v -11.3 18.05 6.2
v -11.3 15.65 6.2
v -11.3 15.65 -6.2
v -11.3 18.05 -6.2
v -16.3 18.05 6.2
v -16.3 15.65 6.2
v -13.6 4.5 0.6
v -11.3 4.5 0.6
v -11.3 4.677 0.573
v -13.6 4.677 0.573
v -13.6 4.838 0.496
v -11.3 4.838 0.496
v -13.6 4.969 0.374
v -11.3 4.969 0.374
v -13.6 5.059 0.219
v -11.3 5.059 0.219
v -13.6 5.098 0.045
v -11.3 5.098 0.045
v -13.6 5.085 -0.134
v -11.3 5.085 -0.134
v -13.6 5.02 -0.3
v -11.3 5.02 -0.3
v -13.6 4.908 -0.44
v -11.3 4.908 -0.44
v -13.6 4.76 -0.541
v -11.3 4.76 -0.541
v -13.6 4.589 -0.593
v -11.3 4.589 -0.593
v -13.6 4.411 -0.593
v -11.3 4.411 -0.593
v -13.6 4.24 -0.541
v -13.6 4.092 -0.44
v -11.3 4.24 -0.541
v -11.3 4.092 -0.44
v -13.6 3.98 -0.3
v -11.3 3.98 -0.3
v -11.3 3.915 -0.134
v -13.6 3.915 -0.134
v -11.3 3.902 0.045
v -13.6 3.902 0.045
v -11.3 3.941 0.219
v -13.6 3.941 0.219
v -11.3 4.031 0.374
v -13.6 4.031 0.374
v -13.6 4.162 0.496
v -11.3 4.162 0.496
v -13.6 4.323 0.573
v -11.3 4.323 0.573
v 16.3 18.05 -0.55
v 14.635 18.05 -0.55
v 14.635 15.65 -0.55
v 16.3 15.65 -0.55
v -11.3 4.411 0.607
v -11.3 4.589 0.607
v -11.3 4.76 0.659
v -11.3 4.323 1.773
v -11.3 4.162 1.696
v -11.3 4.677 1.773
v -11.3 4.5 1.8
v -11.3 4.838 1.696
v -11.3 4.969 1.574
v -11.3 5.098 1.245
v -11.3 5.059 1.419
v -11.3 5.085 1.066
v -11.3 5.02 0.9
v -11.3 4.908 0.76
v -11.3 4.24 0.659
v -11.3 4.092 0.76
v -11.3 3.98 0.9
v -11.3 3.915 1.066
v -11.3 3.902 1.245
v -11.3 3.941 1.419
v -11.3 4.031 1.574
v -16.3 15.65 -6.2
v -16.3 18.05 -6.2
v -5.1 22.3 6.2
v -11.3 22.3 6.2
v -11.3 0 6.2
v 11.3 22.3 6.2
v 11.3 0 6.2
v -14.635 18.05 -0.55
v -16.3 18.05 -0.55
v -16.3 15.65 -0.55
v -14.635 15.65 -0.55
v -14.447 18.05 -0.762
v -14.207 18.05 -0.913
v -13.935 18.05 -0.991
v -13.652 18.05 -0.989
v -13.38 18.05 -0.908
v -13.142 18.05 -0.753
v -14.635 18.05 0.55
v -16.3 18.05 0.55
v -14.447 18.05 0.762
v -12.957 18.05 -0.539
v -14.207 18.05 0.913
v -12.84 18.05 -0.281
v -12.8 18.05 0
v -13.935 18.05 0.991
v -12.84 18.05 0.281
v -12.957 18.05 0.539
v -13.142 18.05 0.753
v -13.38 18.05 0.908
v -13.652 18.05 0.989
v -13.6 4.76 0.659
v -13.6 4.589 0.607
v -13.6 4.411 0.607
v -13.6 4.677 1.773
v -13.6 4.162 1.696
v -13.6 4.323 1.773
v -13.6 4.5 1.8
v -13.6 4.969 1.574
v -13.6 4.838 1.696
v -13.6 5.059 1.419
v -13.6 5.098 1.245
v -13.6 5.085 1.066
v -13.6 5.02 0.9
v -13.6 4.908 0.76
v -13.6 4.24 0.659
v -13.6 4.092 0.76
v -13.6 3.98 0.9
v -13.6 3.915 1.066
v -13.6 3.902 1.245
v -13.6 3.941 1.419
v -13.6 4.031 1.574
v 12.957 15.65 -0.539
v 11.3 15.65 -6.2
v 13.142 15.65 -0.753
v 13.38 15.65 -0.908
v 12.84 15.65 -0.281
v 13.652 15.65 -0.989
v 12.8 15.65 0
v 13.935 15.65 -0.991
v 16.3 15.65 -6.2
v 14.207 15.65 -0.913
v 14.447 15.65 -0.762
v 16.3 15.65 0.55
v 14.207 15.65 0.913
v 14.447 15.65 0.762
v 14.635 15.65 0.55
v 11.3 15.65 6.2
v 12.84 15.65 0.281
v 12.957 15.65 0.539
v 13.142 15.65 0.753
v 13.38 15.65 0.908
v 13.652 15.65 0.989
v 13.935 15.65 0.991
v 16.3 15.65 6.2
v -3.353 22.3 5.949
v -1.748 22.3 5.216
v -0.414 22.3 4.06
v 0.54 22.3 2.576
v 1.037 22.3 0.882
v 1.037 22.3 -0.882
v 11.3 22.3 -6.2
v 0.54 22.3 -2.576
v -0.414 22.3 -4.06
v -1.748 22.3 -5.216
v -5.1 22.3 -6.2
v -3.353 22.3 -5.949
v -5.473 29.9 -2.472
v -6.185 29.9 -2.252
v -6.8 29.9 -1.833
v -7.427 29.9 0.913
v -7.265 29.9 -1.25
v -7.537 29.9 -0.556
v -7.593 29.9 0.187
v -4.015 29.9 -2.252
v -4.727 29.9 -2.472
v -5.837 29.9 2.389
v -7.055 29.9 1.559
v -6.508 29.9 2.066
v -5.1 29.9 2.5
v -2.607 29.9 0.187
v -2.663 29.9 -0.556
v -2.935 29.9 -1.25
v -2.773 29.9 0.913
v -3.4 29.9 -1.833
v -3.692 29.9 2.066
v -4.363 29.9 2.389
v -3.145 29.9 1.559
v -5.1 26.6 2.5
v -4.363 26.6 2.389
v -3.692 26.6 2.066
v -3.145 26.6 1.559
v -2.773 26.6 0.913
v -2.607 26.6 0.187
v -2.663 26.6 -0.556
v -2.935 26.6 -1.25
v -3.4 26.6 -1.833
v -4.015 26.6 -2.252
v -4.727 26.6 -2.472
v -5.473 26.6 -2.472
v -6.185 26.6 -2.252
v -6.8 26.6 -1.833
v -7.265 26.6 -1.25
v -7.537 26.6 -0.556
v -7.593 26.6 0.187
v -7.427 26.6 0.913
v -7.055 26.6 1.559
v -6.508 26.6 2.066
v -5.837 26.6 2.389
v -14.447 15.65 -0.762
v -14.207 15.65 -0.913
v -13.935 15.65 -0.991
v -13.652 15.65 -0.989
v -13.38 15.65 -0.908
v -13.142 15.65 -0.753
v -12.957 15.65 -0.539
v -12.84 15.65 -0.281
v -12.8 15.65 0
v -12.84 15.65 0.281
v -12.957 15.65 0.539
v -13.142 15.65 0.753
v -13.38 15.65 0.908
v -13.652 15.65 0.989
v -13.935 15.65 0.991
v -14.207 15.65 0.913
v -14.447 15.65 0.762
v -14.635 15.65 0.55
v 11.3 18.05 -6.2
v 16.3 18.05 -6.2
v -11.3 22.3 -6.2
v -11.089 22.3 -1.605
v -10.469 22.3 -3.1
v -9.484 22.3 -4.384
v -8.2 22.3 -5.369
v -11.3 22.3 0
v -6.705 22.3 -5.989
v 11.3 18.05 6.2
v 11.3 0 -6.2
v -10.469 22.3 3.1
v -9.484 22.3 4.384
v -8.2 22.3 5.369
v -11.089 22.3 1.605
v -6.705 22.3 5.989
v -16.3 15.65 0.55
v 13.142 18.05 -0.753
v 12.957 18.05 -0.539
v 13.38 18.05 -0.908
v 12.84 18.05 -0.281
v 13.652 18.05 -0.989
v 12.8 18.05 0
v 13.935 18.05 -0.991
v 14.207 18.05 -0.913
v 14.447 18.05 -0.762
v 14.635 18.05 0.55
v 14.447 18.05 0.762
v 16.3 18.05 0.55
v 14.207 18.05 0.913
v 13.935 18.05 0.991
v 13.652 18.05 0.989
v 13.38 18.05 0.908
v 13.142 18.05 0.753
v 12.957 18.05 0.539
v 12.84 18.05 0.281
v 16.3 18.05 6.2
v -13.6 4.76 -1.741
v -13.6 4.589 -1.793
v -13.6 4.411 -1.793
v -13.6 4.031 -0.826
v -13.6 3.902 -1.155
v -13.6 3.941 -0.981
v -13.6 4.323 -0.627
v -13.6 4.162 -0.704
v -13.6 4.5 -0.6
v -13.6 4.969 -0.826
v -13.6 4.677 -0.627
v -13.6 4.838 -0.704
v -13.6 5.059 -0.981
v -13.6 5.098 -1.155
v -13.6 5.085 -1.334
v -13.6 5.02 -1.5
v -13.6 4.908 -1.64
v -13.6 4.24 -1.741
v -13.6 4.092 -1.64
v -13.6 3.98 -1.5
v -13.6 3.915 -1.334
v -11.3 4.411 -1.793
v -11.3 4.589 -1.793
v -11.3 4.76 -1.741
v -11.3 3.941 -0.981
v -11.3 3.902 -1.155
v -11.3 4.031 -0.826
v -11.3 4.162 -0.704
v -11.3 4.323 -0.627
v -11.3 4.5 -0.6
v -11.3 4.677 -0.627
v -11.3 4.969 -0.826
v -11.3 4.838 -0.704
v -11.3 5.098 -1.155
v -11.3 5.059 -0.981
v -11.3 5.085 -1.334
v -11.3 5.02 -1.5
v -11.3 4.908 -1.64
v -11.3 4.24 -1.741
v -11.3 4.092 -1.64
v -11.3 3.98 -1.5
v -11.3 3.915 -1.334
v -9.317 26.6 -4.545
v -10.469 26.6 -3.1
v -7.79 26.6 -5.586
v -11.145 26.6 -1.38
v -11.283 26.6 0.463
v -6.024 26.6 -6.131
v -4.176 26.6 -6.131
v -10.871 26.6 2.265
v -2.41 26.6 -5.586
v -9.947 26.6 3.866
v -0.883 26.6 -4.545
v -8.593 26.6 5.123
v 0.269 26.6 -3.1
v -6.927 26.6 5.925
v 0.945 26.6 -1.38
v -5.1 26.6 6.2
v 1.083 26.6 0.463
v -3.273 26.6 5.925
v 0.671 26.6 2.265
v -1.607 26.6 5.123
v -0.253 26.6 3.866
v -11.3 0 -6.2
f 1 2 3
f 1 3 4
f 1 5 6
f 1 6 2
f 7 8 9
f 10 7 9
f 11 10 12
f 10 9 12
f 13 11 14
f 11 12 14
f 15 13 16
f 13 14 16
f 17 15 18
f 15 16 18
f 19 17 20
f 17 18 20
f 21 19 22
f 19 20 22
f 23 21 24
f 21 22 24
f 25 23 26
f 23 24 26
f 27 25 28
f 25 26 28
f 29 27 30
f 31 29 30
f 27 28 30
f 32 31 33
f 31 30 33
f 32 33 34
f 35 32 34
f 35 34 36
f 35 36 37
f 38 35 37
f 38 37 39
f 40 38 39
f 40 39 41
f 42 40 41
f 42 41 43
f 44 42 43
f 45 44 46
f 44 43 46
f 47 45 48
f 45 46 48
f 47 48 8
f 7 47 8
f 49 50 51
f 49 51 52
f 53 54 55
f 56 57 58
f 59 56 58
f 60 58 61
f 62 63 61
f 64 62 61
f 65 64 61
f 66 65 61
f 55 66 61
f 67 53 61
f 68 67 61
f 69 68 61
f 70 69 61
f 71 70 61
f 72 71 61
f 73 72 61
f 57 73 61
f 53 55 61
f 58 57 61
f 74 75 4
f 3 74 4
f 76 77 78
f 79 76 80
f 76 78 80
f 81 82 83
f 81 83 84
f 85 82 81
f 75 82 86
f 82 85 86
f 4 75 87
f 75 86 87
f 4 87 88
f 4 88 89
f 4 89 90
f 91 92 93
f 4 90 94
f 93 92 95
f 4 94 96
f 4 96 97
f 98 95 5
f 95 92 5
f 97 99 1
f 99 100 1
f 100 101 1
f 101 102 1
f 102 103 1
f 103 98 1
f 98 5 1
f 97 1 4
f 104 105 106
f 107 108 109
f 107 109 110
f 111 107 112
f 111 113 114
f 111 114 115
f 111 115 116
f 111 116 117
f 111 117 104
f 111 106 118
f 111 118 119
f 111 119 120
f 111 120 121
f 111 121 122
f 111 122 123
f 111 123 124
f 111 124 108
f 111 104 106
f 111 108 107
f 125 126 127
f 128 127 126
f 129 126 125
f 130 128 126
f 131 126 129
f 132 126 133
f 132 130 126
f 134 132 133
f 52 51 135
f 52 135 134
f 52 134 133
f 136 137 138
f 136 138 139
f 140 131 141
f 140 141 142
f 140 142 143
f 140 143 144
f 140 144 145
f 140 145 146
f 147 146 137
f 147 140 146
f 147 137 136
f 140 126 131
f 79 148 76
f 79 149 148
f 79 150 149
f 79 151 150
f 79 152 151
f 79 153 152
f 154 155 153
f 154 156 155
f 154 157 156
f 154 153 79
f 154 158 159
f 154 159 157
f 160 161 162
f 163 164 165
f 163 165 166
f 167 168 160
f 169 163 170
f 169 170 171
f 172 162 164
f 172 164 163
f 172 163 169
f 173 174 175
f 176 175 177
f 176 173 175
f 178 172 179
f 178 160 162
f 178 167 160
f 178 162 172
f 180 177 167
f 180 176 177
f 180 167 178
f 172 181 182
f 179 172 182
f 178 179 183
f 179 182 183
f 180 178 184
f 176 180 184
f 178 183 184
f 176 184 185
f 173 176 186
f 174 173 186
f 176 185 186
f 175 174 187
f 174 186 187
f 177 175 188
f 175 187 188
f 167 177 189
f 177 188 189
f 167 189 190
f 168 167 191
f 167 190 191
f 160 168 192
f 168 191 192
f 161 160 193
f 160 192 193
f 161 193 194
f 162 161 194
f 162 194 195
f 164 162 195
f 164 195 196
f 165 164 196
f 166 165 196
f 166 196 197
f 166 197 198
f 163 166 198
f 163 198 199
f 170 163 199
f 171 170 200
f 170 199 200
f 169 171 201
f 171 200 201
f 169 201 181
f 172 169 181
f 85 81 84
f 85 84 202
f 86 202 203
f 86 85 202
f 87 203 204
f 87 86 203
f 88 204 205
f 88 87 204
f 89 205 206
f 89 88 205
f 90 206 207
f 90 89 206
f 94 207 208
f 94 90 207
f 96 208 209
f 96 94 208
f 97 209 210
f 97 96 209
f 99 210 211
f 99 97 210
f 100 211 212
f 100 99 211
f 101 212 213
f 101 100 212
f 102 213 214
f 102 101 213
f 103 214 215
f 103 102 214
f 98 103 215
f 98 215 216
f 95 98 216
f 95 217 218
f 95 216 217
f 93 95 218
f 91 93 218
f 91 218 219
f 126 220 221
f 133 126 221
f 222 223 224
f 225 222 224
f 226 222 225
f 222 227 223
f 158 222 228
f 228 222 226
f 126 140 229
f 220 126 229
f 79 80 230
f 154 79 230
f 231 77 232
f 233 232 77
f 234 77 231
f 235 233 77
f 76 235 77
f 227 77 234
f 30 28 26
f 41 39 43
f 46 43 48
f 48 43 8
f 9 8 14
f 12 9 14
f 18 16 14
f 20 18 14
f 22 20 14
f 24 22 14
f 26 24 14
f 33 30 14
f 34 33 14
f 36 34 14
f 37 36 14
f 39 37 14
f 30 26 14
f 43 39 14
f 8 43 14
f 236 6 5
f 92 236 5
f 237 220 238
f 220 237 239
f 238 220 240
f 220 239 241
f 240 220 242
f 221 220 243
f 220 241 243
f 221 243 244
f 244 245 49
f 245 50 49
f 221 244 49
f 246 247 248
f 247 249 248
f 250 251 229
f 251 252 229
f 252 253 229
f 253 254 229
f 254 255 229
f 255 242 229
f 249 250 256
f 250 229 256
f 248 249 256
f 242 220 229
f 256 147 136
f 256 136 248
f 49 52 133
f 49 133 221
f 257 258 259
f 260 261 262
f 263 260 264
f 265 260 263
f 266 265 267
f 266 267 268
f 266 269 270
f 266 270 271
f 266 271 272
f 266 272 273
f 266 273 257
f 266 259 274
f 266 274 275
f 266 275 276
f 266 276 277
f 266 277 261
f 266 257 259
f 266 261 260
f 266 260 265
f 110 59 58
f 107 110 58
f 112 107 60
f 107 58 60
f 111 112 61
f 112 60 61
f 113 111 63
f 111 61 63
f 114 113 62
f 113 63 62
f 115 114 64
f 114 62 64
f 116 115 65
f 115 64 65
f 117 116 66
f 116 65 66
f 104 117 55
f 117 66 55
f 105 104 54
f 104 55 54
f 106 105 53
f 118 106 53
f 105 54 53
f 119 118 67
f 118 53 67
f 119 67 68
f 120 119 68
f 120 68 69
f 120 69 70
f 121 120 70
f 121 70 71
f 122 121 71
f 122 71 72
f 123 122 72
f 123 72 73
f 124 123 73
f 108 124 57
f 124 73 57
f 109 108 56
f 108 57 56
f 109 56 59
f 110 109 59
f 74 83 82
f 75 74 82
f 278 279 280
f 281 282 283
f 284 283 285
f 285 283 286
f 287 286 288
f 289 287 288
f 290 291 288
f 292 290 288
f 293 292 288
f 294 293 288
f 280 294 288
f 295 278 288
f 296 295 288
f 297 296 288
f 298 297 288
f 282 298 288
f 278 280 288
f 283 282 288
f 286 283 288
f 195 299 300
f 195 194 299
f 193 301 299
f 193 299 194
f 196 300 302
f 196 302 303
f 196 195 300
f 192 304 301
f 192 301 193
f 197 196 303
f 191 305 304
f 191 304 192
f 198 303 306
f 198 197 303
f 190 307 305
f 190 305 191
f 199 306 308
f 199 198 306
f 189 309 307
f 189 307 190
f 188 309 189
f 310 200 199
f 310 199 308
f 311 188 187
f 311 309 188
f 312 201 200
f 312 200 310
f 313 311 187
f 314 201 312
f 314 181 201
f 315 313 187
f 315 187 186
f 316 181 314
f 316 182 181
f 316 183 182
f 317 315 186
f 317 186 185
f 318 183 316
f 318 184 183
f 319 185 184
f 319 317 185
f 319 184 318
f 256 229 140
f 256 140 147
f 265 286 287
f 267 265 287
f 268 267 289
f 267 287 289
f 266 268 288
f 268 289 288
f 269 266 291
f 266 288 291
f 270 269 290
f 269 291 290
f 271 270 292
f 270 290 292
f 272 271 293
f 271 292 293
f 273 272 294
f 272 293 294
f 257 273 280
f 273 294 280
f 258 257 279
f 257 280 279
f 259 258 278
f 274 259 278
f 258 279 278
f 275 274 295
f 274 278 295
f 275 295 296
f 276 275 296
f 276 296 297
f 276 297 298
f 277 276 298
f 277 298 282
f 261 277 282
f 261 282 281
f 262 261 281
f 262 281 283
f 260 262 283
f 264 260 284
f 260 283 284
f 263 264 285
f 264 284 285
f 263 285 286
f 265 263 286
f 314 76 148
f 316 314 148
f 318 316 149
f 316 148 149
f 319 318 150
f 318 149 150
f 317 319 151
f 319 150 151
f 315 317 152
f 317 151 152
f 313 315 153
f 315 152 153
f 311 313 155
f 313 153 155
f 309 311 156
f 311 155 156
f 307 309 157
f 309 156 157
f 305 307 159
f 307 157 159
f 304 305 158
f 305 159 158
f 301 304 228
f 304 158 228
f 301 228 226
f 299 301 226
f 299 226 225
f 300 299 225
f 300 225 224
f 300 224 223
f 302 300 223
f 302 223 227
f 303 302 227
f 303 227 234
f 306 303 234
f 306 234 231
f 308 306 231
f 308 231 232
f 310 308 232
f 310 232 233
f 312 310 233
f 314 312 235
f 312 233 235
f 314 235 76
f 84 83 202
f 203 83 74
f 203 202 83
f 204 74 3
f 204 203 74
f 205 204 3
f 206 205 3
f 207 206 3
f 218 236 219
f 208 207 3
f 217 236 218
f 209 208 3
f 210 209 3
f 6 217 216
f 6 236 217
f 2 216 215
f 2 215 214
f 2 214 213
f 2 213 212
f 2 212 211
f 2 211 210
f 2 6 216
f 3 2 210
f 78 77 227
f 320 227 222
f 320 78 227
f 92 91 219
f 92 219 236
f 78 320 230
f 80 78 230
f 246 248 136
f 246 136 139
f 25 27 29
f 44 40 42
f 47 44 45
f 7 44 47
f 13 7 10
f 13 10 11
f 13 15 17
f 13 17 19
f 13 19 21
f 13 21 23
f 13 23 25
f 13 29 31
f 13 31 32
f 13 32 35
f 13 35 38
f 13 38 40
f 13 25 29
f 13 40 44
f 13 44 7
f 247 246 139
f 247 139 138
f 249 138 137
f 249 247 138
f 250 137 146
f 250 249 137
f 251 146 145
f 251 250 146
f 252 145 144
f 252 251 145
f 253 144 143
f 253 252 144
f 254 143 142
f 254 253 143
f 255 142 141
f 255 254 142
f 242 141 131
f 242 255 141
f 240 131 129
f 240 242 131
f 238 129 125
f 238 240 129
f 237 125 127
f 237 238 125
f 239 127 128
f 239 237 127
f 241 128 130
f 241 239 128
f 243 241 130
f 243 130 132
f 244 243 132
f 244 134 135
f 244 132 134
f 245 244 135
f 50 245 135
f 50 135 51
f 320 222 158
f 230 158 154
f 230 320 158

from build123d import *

# Parameters (mm, degrees)
SKETCH_1_W          = 22.6
SKETCH_1_H          = 12.4
EXTRUDE_1_DEPTH     = 22.3
SKETCH_2_W          = 5
SKETCH_2_H          = 2.4
EXTRUDE_2_DEPTH     = 12.4
EXTRUDE_2_2_DEPTH   = 12.4
CUT_EXTRUDE_1_DEPTH = 26.098456128
SKETCH_4_R          = 6.2
EXTRUDE_3_DEPTH     = 4.3
SKETCH_5_R          = 2.5
EXTRUDE_4_DEPTH     = 3.3
SKETCH_6_R          = 0.6
EXTRUDE_8_DEPTH     = 2.3
EXTRUDE_8_2_DEPTH   = 2.3
EXTRUDE_8_3_DEPTH   = 2.3


with BuildPart() as part:
    # 草图1 → 凸台-拉伸1 (new body)
    with BuildSketch(Plane(origin=(0, 0, 0), x_dir=(1, 0, 0), z_dir=(0, 1, 0))):
        Rectangle(SKETCH_1_W, SKETCH_1_H)
    extrude(amount=EXTRUDE_1_DEPTH)

    # 草图4 → 凸台-拉伸3 (add)
    with BuildSketch(Plane(origin=(0, 22.3, 0), x_dir=(1, 0, 0), z_dir=(0, 1, 0))):
        with Locations(Location((-5.1, 0, 0), (0, 0, 270))):
            Circle(SKETCH_4_R)
    extrude(amount=EXTRUDE_3_DEPTH)

    # 草图5 → 凸台-拉伸4 (add)
    with BuildSketch(Plane(origin=(0, 26.6, 0), x_dir=(1, 0, 0), z_dir=(0, 1, 0))):
        with Locations(Location((-5.1, 0, 0), (0, 0, 270))):
            Circle(SKETCH_5_R)
    extrude(amount=EXTRUDE_4_DEPTH)


with BuildPart() as body_2:
    # 草图2 → 凸台-拉伸2 (new, through all)
    with BuildSketch(Plane.XY.offset(6.2)):
        with Locations((13.8, 16.85)):
            Rectangle(SKETCH_2_W, SKETCH_2_H)
    extrude(amount=-EXTRUDE_2_DEPTH)


with BuildPart() as body_3:
    # 草图2 → Extrude 2 2 (new, through all)
    with BuildSketch(Plane.XY.offset(6.2)):
        with Locations((-13.8, 16.85)):
            Rectangle(SKETCH_2_W, SKETCH_2_H)
    extrude(amount=-EXTRUDE_2_2_DEPTH)


with BuildPart() as cut_extrude_1_tool:
    # 草图3 → 切除-拉伸1 (new, through all)
    with BuildSketch(Plane(origin=(0, 18.05, 0), x_dir=(1, 0, 0), z_dir=(0, 1, 0))):
        with BuildLine():
            Line((14.635164654, 0.55), (16.3, 0.55))
            Line((16.3, 0.55), (16.3, -0.55))
            Line((16.3, -0.55), (14.635164654, -0.55))
            ThreePointArc((14.635164654, -0.55), (12.8, 0), (14.635164654, 0.55))
        make_face()
        with BuildLine():
            Line((-14.635164654, -0.55), (-16.3, -0.55))
            Line((-16.3, -0.55), (-16.3, 0.55))
            Line((-16.3, 0.55), (-14.635164654, 0.55))
            ThreePointArc((-14.635164654, 0.55), (-12.8, 0), (-14.635164654, -0.55))
        make_face()
    extrude(amount=-CUT_EXTRUDE_1_DEPTH)


with BuildPart() as body_2_1:
    add(body_2.part)

    # 切除-拉伸1: cut by cut_extrude_1_tool
    add(cut_extrude_1_tool.part, mode=Mode.SUBTRACT)


with BuildPart() as body_3_1:
    add(body_3.part)

    # 切除-拉伸1: cut by cut_extrude_1_tool
    add(cut_extrude_1_tool.part, mode=Mode.SUBTRACT)


with BuildPart() as body_4:
    # 草图6 → 凸台-拉伸8 (new body)
    with BuildSketch(Plane.ZY.offset(11.3)):
        with Locations((0, 4.5)):
            Circle(SKETCH_6_R)
    extrude(amount=EXTRUDE_8_DEPTH)


with BuildPart() as body_5:
    # 草图6 → Extrude 8 2 (new body)
    with BuildSketch(Plane.ZY.offset(11.3)):
        with Locations((1.2, 4.5)):
            Circle(SKETCH_6_R)
    extrude(amount=EXTRUDE_8_2_DEPTH)


with BuildPart() as body_6:
    # 草图6 → Extrude 8 3 (new body)
    with BuildSketch(Plane.ZY.offset(11.3)):
        with Locations((-1.2, 4.5)):
            Circle(SKETCH_6_R)
    extrude(amount=EXTRUDE_8_3_DEPTH)


solid = Compound([part.part, body_2_1.part, body_3_1.part, body_4.part, body_5.part, body_6.part])
